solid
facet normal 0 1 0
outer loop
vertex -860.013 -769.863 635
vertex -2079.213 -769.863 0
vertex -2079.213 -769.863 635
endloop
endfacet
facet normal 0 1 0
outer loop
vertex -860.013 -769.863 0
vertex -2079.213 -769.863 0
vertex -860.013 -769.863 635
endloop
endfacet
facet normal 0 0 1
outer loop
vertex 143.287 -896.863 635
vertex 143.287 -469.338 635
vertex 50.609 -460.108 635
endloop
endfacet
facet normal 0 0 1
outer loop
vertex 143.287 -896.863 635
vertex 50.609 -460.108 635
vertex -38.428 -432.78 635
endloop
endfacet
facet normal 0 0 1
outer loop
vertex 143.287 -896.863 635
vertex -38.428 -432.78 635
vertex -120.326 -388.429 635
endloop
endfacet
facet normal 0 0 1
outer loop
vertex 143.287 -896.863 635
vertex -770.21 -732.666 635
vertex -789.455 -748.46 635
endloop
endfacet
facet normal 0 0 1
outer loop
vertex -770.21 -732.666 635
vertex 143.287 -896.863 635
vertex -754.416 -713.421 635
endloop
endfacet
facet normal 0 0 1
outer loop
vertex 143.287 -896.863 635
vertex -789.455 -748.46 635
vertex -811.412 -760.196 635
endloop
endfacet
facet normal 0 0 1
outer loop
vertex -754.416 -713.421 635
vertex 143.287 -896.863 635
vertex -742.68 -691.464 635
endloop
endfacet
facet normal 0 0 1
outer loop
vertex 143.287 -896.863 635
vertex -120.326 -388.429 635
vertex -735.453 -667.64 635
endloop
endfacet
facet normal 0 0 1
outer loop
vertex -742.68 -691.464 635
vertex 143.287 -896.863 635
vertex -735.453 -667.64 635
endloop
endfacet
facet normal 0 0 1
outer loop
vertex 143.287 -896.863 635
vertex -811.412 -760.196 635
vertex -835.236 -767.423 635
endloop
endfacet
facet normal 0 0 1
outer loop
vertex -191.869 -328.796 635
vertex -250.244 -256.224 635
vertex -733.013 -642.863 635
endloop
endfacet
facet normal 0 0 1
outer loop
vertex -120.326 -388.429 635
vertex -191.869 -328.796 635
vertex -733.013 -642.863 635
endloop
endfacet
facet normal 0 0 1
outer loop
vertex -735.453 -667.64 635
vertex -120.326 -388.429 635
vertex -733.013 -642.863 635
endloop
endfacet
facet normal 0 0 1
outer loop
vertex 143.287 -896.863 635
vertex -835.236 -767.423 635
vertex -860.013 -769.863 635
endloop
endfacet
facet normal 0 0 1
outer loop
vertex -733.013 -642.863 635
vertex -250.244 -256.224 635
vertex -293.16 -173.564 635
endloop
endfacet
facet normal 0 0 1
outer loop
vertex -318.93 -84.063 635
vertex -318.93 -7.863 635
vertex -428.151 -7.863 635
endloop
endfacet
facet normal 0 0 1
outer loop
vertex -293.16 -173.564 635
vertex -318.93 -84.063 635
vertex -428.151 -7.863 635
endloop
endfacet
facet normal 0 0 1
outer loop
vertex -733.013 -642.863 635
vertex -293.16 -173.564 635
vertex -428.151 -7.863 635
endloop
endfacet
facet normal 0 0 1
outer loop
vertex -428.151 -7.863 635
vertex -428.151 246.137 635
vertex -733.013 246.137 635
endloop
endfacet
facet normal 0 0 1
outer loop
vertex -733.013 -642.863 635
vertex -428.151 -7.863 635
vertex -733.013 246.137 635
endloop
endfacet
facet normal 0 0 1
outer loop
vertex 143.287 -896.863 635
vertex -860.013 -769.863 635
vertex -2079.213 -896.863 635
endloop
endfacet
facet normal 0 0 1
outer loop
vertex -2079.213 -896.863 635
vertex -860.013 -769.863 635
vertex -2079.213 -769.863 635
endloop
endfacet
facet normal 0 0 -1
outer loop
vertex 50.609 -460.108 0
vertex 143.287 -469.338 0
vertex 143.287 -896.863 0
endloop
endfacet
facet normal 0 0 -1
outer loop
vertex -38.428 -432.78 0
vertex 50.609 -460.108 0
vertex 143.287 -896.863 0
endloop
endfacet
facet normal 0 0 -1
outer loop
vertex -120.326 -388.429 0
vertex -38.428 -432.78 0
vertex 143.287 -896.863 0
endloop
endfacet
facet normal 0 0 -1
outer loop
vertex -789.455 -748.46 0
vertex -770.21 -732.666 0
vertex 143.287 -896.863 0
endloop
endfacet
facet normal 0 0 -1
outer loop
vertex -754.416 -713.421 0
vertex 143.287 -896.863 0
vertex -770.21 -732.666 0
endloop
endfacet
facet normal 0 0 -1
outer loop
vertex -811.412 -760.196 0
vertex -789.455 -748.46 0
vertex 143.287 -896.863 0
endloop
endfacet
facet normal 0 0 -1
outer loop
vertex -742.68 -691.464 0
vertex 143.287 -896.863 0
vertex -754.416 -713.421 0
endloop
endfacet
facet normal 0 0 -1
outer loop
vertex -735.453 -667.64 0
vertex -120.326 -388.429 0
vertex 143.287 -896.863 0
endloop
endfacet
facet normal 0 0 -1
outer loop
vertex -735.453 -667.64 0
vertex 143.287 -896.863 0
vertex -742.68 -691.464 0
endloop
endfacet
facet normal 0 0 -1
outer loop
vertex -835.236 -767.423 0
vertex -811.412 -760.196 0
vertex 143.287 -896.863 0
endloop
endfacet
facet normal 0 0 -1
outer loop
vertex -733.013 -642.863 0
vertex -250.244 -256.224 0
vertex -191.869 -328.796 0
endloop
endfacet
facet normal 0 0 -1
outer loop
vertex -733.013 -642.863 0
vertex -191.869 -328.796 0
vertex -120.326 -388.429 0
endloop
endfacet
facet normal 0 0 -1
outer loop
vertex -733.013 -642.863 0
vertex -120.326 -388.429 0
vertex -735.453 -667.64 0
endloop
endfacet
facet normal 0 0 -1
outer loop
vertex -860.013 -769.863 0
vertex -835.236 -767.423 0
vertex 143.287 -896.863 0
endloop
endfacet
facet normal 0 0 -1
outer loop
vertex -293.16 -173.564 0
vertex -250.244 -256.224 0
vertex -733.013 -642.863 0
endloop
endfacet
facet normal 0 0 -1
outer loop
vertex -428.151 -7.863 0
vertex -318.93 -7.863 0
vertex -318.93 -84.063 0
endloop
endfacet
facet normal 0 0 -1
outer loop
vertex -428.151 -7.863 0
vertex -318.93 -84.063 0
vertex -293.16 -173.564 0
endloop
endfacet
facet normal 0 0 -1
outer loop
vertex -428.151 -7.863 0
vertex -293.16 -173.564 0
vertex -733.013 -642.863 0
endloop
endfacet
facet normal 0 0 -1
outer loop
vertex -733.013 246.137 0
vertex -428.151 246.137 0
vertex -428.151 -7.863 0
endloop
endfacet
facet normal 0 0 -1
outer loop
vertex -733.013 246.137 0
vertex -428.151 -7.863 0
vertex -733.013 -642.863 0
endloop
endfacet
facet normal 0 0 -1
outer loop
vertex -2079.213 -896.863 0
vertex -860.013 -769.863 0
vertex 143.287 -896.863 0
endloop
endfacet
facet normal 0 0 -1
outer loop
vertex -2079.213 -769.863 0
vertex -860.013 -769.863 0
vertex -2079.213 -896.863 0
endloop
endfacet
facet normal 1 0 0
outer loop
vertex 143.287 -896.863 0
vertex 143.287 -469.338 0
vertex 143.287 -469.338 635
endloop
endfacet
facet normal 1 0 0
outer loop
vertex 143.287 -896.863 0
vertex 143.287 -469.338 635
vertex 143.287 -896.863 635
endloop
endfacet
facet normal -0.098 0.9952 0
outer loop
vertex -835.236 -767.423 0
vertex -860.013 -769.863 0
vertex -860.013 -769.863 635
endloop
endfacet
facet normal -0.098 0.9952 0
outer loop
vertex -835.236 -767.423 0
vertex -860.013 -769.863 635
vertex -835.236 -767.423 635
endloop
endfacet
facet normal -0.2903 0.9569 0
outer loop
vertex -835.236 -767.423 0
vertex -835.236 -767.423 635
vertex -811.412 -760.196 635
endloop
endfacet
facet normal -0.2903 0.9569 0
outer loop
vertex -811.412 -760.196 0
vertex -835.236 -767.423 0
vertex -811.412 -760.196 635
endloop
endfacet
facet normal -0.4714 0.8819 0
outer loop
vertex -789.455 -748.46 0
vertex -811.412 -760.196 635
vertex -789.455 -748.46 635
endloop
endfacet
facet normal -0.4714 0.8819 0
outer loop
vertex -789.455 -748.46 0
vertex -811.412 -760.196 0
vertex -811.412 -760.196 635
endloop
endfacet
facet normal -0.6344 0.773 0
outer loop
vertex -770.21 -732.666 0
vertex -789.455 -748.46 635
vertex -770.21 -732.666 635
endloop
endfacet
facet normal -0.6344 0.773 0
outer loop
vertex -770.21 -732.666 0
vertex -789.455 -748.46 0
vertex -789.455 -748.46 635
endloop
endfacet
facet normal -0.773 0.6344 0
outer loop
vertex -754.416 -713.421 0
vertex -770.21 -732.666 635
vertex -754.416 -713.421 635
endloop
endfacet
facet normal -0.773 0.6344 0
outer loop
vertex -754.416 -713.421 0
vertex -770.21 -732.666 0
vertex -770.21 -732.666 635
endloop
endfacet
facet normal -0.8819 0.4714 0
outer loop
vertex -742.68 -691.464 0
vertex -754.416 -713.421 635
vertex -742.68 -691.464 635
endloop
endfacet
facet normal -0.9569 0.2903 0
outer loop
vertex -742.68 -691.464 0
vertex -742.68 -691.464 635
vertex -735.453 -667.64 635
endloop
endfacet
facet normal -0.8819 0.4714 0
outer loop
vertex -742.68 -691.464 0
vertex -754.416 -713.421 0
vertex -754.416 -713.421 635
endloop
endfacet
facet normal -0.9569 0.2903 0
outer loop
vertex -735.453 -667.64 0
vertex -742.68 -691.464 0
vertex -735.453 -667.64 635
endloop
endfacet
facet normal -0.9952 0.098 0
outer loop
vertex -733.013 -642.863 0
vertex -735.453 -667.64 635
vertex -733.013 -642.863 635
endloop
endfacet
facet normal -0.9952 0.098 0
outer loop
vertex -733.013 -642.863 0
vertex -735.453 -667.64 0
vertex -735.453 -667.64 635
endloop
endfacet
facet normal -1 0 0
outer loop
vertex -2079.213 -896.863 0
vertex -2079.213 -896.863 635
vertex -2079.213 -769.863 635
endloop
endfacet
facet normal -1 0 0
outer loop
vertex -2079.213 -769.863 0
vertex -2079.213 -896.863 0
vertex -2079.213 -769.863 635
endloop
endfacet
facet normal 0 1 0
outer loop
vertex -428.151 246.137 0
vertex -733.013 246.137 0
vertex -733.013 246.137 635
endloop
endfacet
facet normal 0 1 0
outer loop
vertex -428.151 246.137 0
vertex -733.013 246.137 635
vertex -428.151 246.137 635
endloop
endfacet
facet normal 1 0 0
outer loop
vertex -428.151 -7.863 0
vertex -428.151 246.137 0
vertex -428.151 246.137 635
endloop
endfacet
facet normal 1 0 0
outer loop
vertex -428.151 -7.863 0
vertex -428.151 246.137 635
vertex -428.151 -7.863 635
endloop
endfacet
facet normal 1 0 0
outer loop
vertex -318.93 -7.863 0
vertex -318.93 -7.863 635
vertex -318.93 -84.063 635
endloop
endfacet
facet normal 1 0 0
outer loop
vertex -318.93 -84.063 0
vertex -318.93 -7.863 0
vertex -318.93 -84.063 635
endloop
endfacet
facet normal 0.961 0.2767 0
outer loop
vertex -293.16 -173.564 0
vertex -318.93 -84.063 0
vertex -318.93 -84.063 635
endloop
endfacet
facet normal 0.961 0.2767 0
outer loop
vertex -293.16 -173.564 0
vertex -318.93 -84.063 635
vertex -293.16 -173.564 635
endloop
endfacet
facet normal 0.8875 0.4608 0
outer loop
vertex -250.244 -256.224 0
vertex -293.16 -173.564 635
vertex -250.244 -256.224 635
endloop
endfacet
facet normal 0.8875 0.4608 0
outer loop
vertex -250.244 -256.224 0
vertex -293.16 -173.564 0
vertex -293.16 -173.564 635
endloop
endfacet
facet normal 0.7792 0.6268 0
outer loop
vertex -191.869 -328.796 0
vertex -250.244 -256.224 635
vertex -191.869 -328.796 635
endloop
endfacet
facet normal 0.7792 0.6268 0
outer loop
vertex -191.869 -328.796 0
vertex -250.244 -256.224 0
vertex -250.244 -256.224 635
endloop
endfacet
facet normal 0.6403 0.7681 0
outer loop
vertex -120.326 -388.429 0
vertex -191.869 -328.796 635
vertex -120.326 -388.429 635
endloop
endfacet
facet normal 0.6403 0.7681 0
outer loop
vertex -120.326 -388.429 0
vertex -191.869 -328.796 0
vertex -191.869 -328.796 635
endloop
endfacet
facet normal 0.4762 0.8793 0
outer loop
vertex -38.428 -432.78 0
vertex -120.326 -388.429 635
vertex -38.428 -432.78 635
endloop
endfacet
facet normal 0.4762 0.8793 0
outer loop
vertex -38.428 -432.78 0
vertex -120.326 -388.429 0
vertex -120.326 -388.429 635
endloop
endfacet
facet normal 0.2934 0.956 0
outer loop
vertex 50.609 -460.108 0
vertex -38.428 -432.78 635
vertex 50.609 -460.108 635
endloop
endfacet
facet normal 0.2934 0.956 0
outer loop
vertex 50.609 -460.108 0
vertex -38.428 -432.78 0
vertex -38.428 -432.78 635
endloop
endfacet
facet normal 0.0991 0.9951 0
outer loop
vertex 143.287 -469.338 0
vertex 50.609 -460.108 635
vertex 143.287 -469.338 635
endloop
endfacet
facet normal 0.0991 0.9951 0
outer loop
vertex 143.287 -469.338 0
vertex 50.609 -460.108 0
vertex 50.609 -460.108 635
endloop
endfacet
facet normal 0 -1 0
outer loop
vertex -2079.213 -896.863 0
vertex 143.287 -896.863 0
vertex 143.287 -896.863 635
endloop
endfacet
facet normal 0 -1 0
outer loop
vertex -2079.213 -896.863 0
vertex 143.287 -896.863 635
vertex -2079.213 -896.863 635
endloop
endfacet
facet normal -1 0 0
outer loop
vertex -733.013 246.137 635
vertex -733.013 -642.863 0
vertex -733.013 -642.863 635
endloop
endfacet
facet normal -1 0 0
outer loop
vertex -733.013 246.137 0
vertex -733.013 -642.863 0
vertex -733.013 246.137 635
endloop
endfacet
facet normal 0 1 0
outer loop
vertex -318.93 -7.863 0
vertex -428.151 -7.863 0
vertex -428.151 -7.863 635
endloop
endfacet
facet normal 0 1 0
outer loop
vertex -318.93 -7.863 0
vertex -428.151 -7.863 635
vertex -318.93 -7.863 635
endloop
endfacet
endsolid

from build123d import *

# Parameters (mm, degrees)
BOSS_EXTRUDE1_DEPTH = 635


with BuildPart() as part:
    # Sketch3 → Boss-Extrude1 (new body)
    with BuildSketch(Plane.XY):
        with BuildLine():
            Line((-2079.212661728, -769.863228), (-860.012661728, -769.863228))
            ThreePointArc((-860.012661728, -769.863228), (-770.210100518, -732.665789211), (-733.012661728, -642.863228))
            Line((-733.012661728, -642.863228), (-733.012661728, 246.136772))
            Line((-733.012661728, 246.136772), (-428.150553924, 246.136772))
            Line((-428.150553924, 246.136772), (-428.150553924, -7.863228))
            Line((-428.150553924, -7.863228), (-326.612661728, -7.863228))
            Line((-326.612661728, -7.863228), (-318.929679791, -7.863228))
            Line((-318.929679791, -7.863228), (-318.929679791, -84.063228))
            ThreePointArc((-318.929679791, -84.063228), (-157.578570713, -360.389072068), (143.287338272, -469.33794683))
            Line((143.287338272, -469.33794683), (143.287338272, -896.863228))
            Line((143.287338272, -896.863228), (-2079.212661728, -896.863228))
            Line((-2079.212661728, -896.863228), (-2079.212661728, -769.863228))
        make_face()
    extrude(amount=BOSS_EXTRUDE1_DEPTH)


solid = part.part
